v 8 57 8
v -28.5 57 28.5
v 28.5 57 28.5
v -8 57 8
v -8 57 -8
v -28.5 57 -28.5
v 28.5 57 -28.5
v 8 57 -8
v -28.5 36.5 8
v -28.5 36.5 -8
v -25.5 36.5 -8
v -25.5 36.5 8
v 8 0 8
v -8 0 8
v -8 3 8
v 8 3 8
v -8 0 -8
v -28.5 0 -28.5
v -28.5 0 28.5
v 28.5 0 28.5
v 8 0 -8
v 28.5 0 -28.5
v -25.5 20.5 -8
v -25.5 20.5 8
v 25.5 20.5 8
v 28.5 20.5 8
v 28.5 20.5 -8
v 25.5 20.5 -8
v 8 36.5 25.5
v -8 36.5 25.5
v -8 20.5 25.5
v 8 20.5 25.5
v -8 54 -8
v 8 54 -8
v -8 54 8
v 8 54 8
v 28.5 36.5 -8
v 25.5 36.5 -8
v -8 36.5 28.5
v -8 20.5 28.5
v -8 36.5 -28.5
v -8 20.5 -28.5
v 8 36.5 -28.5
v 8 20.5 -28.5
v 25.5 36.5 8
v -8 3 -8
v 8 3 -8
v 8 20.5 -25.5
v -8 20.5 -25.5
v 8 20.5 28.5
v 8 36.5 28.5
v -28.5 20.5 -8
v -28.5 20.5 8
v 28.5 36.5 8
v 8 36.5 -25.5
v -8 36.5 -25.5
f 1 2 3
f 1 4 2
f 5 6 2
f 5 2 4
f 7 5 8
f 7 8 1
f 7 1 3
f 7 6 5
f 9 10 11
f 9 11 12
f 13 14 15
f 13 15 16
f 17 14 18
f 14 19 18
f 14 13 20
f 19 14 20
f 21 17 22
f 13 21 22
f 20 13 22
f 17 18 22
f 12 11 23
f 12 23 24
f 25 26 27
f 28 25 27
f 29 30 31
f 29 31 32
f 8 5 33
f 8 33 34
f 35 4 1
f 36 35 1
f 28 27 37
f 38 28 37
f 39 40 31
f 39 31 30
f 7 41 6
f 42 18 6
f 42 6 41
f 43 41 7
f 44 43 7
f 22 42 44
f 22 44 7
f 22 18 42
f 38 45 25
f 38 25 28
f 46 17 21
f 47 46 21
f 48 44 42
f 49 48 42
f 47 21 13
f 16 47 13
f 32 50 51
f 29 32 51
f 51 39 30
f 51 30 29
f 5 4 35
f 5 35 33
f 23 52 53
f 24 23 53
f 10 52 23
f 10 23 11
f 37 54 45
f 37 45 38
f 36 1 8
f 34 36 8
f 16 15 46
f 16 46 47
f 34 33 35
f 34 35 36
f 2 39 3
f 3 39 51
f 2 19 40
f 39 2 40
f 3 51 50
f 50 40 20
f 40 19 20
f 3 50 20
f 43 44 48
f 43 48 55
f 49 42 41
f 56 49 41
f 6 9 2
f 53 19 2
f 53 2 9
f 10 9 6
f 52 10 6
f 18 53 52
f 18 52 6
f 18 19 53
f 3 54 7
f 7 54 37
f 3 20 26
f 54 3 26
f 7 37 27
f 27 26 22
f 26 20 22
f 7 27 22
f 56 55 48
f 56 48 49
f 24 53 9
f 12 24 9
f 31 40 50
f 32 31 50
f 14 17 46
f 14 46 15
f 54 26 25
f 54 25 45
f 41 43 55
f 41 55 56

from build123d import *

# Parameters (mm, degrees)
SKETCH_1_W          = 57
SKETCH_1_H          = 57
EXTRUDE_1_DEPTH     = 57
SKETCH_2_W          = 16
SKETCH_2_H          = 16
CUT_EXTRUDE_1_DEPTH = 3
SKETCH_3_W          = 16
SKETCH_3_H          = 16
CUT_EXTRUDE_2_DEPTH = 3
SKETCH_4_W          = 16
SKETCH_4_H          = 16
CUT_EXTRUDE_3_DEPTH = 3
SKETCH_5_W          = 16
SKETCH_5_H          = 16
CUT_EXTRUDE_4_DEPTH = 3
SKETCH_6_W          = 16
SKETCH_6_H          = 16
CUT_EXTRUDE_5_DEPTH = 3
SKETCH_7_W          = 16
SKETCH_7_H          = 16
CUT_EXTRUDE_6_DEPTH = 3


with BuildPart() as part:
    # 草图1 → 凸台-拉伸1 (new body)
    with BuildSketch(Plane(origin=(0, 0, 0), x_dir=(1, 0, 0), z_dir=(0, 1, 0))):
        Rectangle(SKETCH_1_W, SKETCH_1_H)
    extrude(amount=EXTRUDE_1_DEPTH)

    # 草图2 → 切除-拉伸1 (cut)
    with BuildSketch(Plane.XY.offset(28.5)):
        with Locations((0, 28.5)):
            Rectangle(SKETCH_2_W, SKETCH_2_H)
    extrude(amount=-CUT_EXTRUDE_1_DEPTH, mode=Mode.SUBTRACT)

    # 草图3 → 切除-拉伸2 (cut)
    with BuildSketch(Plane(origin=(28.5, 0, 0), x_dir=(0, 0, -1), z_dir=(1, 0, 0))):
        with Locations((0, 28.5)):
            Rectangle(SKETCH_3_W, SKETCH_3_H)
    extrude(amount=-CUT_EXTRUDE_2_DEPTH, mode=Mode.SUBTRACT)

    # 草图4 → 切除-拉伸3 (cut)
    with BuildSketch(Plane(origin=(0, 0, -28.5), x_dir=(-1, 0, 0), z_dir=(0, 0, -1))):
        with Locations((0, 28.5)):
            Rectangle(SKETCH_4_W, SKETCH_4_H)
    extrude(amount=-CUT_EXTRUDE_3_DEPTH, mode=Mode.SUBTRACT)

    # 草图5 → 切除-拉伸4 (cut)
    with BuildSketch(Plane.ZY.offset(28.5)):
        with Locations((0, 28.5)):
            Rectangle(SKETCH_5_W, SKETCH_5_H)
    extrude(amount=-CUT_EXTRUDE_4_DEPTH, mode=Mode.SUBTRACT)

    # 草图6 → 切除-拉伸5 (cut)
    with BuildSketch(Plane(origin=(0, 57, 0), x_dir=(1, 0, 0), z_dir=(0, 1, 0))):
        Rectangle(SKETCH_6_W, SKETCH_6_H)
    extrude(amount=-CUT_EXTRUDE_5_DEPTH, mode=Mode.SUBTRACT)

    # 草图7 → 切除-拉伸6 (cut)
    with BuildSketch(Plane.XZ):
        Rectangle(SKETCH_7_W, SKETCH_7_H)
    extrude(amount=-CUT_EXTRUDE_6_DEPTH, mode=Mode.SUBTRACT)


solid = part.part
